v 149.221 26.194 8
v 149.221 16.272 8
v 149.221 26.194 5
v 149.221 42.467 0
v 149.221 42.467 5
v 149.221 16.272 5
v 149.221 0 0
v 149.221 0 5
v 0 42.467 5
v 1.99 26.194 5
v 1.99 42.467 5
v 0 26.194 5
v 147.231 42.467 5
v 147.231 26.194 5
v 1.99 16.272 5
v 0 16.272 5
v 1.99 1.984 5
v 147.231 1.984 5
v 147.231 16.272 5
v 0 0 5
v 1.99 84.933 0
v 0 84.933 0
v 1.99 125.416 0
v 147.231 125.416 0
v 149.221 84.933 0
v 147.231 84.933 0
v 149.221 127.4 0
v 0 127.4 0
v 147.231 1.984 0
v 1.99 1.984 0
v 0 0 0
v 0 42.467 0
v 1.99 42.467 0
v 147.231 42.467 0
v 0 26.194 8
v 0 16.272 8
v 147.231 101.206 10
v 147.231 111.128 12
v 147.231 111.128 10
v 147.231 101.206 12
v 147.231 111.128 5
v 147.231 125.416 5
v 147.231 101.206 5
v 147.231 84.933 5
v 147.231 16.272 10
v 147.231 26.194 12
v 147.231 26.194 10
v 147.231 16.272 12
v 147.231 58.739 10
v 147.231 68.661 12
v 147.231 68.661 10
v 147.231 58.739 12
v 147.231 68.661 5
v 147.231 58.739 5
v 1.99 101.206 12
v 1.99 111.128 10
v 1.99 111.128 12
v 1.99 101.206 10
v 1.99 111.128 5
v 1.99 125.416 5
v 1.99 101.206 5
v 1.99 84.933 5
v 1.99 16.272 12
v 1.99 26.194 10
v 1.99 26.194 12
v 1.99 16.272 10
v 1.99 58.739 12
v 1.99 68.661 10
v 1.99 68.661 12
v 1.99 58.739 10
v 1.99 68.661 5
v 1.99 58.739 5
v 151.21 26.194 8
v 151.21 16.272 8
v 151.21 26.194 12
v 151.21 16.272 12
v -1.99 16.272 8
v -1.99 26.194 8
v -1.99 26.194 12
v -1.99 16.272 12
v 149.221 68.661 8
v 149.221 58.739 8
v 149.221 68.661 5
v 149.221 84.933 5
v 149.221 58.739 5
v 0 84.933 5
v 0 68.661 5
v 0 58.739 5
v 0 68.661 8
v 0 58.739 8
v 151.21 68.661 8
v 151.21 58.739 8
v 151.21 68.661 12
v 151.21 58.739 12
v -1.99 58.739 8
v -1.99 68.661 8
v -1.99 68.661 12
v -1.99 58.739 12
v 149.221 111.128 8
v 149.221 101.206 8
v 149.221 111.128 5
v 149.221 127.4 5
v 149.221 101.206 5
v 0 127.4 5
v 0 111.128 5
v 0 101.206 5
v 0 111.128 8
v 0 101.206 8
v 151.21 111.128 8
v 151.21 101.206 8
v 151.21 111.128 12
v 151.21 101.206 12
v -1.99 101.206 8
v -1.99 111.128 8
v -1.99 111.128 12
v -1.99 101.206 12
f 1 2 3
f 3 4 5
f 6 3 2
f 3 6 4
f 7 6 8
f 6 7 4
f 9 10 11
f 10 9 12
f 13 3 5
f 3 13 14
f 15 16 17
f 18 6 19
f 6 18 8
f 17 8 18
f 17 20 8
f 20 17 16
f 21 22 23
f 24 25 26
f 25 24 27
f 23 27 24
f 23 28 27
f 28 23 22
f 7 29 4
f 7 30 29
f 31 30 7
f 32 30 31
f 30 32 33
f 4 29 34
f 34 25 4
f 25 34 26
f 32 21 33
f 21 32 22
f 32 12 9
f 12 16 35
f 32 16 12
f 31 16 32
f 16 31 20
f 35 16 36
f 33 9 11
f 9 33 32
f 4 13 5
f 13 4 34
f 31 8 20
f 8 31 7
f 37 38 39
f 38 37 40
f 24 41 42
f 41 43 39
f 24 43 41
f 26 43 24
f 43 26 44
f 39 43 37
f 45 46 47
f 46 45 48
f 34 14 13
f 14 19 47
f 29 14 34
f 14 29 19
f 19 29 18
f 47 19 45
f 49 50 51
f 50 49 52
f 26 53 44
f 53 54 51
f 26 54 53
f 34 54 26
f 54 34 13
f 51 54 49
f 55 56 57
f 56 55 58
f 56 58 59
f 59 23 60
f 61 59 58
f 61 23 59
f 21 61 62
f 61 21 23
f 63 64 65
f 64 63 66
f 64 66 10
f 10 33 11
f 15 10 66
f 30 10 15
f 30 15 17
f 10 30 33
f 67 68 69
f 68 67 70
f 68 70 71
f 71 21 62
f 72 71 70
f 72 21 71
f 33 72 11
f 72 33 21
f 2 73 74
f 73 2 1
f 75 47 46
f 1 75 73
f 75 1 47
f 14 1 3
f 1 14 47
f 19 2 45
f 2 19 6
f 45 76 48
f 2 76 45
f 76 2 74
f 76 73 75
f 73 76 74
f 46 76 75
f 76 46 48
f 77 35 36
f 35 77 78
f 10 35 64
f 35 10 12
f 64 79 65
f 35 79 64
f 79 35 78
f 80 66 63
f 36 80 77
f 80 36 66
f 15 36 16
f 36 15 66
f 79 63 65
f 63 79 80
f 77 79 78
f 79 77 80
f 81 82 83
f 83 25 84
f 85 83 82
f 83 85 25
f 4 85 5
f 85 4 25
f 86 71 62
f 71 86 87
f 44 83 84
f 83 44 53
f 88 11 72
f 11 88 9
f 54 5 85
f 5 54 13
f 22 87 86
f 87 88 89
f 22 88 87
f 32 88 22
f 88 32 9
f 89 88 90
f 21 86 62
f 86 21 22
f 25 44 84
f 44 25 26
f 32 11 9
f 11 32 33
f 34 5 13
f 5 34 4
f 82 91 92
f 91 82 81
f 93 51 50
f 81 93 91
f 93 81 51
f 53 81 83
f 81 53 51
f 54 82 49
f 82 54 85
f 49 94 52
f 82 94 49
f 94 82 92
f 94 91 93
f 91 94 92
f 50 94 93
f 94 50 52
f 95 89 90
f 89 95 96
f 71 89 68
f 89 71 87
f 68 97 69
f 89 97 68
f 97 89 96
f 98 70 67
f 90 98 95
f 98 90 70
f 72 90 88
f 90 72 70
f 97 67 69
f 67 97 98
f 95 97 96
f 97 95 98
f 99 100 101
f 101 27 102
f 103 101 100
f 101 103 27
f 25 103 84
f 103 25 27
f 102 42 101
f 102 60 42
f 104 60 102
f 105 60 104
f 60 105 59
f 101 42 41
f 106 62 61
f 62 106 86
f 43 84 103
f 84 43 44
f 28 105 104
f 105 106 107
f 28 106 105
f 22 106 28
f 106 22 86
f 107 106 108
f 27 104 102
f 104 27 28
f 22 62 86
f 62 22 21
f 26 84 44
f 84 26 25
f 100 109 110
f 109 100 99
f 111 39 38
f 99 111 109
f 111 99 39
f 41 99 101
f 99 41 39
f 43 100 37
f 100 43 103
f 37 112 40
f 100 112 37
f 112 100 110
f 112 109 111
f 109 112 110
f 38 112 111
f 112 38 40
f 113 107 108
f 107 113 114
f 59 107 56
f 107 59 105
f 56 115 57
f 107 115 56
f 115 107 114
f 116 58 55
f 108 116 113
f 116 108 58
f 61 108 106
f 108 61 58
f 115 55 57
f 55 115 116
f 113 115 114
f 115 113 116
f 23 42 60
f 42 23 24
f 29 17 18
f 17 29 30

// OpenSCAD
length = 150;  // mm 
width = 42.8;



module hull(hooks){
    translate([length/2, width/2 , 0]) {
        translate([0, 0, 2.5])
            difference() {
                cube([length,width,5], center= true);
                cube([length-4,width-4,5], center= true);
            }

        if (hooks) {
            translate([length/2-1, 0, 4]){
                cube ([2, 10 , 8], center = true);
                translate([1,0,6])
                    cube ([4, 10 , 4], center = true);
            }


            translate([-length/2+1, 0, 4]){
                cube ([2, 10 , 8], center = true);
                translate([-1,0,6])
                    cube ([4, 10 , 4], center = true);
            }
        }
    }
}


module gridlg(){
    stepx=6.14;
    stepy=6;
    grid_height = 2.4;
    difference(){
        cube([length, 3*width, grid_height]);
        union(){
            for (x=[0:stepx:length-2]) 
                for (y=[0:stepy:4*width])
                    translate([x+2,y+2,-2])
                        cube([stepx-0.8,stepy-0.8,5]); 
        }
    }
}


resize(newsize=[length+4-0.8,3*width-1,5+7]) {
    union(){
        difference(){
            union(){
                hull(hooks=true);
                translate([0,width,0])
                    hull(hooks=true);
                translate([0,2*width,0])
                    hull(hooks=true);
            }
            translate([2,2,0])
            cube([length-4,3*width-4,10]);
        }
        //gridlg();
        //gridlg2();
    }
}

// hull(hooks=true);
//grid();
